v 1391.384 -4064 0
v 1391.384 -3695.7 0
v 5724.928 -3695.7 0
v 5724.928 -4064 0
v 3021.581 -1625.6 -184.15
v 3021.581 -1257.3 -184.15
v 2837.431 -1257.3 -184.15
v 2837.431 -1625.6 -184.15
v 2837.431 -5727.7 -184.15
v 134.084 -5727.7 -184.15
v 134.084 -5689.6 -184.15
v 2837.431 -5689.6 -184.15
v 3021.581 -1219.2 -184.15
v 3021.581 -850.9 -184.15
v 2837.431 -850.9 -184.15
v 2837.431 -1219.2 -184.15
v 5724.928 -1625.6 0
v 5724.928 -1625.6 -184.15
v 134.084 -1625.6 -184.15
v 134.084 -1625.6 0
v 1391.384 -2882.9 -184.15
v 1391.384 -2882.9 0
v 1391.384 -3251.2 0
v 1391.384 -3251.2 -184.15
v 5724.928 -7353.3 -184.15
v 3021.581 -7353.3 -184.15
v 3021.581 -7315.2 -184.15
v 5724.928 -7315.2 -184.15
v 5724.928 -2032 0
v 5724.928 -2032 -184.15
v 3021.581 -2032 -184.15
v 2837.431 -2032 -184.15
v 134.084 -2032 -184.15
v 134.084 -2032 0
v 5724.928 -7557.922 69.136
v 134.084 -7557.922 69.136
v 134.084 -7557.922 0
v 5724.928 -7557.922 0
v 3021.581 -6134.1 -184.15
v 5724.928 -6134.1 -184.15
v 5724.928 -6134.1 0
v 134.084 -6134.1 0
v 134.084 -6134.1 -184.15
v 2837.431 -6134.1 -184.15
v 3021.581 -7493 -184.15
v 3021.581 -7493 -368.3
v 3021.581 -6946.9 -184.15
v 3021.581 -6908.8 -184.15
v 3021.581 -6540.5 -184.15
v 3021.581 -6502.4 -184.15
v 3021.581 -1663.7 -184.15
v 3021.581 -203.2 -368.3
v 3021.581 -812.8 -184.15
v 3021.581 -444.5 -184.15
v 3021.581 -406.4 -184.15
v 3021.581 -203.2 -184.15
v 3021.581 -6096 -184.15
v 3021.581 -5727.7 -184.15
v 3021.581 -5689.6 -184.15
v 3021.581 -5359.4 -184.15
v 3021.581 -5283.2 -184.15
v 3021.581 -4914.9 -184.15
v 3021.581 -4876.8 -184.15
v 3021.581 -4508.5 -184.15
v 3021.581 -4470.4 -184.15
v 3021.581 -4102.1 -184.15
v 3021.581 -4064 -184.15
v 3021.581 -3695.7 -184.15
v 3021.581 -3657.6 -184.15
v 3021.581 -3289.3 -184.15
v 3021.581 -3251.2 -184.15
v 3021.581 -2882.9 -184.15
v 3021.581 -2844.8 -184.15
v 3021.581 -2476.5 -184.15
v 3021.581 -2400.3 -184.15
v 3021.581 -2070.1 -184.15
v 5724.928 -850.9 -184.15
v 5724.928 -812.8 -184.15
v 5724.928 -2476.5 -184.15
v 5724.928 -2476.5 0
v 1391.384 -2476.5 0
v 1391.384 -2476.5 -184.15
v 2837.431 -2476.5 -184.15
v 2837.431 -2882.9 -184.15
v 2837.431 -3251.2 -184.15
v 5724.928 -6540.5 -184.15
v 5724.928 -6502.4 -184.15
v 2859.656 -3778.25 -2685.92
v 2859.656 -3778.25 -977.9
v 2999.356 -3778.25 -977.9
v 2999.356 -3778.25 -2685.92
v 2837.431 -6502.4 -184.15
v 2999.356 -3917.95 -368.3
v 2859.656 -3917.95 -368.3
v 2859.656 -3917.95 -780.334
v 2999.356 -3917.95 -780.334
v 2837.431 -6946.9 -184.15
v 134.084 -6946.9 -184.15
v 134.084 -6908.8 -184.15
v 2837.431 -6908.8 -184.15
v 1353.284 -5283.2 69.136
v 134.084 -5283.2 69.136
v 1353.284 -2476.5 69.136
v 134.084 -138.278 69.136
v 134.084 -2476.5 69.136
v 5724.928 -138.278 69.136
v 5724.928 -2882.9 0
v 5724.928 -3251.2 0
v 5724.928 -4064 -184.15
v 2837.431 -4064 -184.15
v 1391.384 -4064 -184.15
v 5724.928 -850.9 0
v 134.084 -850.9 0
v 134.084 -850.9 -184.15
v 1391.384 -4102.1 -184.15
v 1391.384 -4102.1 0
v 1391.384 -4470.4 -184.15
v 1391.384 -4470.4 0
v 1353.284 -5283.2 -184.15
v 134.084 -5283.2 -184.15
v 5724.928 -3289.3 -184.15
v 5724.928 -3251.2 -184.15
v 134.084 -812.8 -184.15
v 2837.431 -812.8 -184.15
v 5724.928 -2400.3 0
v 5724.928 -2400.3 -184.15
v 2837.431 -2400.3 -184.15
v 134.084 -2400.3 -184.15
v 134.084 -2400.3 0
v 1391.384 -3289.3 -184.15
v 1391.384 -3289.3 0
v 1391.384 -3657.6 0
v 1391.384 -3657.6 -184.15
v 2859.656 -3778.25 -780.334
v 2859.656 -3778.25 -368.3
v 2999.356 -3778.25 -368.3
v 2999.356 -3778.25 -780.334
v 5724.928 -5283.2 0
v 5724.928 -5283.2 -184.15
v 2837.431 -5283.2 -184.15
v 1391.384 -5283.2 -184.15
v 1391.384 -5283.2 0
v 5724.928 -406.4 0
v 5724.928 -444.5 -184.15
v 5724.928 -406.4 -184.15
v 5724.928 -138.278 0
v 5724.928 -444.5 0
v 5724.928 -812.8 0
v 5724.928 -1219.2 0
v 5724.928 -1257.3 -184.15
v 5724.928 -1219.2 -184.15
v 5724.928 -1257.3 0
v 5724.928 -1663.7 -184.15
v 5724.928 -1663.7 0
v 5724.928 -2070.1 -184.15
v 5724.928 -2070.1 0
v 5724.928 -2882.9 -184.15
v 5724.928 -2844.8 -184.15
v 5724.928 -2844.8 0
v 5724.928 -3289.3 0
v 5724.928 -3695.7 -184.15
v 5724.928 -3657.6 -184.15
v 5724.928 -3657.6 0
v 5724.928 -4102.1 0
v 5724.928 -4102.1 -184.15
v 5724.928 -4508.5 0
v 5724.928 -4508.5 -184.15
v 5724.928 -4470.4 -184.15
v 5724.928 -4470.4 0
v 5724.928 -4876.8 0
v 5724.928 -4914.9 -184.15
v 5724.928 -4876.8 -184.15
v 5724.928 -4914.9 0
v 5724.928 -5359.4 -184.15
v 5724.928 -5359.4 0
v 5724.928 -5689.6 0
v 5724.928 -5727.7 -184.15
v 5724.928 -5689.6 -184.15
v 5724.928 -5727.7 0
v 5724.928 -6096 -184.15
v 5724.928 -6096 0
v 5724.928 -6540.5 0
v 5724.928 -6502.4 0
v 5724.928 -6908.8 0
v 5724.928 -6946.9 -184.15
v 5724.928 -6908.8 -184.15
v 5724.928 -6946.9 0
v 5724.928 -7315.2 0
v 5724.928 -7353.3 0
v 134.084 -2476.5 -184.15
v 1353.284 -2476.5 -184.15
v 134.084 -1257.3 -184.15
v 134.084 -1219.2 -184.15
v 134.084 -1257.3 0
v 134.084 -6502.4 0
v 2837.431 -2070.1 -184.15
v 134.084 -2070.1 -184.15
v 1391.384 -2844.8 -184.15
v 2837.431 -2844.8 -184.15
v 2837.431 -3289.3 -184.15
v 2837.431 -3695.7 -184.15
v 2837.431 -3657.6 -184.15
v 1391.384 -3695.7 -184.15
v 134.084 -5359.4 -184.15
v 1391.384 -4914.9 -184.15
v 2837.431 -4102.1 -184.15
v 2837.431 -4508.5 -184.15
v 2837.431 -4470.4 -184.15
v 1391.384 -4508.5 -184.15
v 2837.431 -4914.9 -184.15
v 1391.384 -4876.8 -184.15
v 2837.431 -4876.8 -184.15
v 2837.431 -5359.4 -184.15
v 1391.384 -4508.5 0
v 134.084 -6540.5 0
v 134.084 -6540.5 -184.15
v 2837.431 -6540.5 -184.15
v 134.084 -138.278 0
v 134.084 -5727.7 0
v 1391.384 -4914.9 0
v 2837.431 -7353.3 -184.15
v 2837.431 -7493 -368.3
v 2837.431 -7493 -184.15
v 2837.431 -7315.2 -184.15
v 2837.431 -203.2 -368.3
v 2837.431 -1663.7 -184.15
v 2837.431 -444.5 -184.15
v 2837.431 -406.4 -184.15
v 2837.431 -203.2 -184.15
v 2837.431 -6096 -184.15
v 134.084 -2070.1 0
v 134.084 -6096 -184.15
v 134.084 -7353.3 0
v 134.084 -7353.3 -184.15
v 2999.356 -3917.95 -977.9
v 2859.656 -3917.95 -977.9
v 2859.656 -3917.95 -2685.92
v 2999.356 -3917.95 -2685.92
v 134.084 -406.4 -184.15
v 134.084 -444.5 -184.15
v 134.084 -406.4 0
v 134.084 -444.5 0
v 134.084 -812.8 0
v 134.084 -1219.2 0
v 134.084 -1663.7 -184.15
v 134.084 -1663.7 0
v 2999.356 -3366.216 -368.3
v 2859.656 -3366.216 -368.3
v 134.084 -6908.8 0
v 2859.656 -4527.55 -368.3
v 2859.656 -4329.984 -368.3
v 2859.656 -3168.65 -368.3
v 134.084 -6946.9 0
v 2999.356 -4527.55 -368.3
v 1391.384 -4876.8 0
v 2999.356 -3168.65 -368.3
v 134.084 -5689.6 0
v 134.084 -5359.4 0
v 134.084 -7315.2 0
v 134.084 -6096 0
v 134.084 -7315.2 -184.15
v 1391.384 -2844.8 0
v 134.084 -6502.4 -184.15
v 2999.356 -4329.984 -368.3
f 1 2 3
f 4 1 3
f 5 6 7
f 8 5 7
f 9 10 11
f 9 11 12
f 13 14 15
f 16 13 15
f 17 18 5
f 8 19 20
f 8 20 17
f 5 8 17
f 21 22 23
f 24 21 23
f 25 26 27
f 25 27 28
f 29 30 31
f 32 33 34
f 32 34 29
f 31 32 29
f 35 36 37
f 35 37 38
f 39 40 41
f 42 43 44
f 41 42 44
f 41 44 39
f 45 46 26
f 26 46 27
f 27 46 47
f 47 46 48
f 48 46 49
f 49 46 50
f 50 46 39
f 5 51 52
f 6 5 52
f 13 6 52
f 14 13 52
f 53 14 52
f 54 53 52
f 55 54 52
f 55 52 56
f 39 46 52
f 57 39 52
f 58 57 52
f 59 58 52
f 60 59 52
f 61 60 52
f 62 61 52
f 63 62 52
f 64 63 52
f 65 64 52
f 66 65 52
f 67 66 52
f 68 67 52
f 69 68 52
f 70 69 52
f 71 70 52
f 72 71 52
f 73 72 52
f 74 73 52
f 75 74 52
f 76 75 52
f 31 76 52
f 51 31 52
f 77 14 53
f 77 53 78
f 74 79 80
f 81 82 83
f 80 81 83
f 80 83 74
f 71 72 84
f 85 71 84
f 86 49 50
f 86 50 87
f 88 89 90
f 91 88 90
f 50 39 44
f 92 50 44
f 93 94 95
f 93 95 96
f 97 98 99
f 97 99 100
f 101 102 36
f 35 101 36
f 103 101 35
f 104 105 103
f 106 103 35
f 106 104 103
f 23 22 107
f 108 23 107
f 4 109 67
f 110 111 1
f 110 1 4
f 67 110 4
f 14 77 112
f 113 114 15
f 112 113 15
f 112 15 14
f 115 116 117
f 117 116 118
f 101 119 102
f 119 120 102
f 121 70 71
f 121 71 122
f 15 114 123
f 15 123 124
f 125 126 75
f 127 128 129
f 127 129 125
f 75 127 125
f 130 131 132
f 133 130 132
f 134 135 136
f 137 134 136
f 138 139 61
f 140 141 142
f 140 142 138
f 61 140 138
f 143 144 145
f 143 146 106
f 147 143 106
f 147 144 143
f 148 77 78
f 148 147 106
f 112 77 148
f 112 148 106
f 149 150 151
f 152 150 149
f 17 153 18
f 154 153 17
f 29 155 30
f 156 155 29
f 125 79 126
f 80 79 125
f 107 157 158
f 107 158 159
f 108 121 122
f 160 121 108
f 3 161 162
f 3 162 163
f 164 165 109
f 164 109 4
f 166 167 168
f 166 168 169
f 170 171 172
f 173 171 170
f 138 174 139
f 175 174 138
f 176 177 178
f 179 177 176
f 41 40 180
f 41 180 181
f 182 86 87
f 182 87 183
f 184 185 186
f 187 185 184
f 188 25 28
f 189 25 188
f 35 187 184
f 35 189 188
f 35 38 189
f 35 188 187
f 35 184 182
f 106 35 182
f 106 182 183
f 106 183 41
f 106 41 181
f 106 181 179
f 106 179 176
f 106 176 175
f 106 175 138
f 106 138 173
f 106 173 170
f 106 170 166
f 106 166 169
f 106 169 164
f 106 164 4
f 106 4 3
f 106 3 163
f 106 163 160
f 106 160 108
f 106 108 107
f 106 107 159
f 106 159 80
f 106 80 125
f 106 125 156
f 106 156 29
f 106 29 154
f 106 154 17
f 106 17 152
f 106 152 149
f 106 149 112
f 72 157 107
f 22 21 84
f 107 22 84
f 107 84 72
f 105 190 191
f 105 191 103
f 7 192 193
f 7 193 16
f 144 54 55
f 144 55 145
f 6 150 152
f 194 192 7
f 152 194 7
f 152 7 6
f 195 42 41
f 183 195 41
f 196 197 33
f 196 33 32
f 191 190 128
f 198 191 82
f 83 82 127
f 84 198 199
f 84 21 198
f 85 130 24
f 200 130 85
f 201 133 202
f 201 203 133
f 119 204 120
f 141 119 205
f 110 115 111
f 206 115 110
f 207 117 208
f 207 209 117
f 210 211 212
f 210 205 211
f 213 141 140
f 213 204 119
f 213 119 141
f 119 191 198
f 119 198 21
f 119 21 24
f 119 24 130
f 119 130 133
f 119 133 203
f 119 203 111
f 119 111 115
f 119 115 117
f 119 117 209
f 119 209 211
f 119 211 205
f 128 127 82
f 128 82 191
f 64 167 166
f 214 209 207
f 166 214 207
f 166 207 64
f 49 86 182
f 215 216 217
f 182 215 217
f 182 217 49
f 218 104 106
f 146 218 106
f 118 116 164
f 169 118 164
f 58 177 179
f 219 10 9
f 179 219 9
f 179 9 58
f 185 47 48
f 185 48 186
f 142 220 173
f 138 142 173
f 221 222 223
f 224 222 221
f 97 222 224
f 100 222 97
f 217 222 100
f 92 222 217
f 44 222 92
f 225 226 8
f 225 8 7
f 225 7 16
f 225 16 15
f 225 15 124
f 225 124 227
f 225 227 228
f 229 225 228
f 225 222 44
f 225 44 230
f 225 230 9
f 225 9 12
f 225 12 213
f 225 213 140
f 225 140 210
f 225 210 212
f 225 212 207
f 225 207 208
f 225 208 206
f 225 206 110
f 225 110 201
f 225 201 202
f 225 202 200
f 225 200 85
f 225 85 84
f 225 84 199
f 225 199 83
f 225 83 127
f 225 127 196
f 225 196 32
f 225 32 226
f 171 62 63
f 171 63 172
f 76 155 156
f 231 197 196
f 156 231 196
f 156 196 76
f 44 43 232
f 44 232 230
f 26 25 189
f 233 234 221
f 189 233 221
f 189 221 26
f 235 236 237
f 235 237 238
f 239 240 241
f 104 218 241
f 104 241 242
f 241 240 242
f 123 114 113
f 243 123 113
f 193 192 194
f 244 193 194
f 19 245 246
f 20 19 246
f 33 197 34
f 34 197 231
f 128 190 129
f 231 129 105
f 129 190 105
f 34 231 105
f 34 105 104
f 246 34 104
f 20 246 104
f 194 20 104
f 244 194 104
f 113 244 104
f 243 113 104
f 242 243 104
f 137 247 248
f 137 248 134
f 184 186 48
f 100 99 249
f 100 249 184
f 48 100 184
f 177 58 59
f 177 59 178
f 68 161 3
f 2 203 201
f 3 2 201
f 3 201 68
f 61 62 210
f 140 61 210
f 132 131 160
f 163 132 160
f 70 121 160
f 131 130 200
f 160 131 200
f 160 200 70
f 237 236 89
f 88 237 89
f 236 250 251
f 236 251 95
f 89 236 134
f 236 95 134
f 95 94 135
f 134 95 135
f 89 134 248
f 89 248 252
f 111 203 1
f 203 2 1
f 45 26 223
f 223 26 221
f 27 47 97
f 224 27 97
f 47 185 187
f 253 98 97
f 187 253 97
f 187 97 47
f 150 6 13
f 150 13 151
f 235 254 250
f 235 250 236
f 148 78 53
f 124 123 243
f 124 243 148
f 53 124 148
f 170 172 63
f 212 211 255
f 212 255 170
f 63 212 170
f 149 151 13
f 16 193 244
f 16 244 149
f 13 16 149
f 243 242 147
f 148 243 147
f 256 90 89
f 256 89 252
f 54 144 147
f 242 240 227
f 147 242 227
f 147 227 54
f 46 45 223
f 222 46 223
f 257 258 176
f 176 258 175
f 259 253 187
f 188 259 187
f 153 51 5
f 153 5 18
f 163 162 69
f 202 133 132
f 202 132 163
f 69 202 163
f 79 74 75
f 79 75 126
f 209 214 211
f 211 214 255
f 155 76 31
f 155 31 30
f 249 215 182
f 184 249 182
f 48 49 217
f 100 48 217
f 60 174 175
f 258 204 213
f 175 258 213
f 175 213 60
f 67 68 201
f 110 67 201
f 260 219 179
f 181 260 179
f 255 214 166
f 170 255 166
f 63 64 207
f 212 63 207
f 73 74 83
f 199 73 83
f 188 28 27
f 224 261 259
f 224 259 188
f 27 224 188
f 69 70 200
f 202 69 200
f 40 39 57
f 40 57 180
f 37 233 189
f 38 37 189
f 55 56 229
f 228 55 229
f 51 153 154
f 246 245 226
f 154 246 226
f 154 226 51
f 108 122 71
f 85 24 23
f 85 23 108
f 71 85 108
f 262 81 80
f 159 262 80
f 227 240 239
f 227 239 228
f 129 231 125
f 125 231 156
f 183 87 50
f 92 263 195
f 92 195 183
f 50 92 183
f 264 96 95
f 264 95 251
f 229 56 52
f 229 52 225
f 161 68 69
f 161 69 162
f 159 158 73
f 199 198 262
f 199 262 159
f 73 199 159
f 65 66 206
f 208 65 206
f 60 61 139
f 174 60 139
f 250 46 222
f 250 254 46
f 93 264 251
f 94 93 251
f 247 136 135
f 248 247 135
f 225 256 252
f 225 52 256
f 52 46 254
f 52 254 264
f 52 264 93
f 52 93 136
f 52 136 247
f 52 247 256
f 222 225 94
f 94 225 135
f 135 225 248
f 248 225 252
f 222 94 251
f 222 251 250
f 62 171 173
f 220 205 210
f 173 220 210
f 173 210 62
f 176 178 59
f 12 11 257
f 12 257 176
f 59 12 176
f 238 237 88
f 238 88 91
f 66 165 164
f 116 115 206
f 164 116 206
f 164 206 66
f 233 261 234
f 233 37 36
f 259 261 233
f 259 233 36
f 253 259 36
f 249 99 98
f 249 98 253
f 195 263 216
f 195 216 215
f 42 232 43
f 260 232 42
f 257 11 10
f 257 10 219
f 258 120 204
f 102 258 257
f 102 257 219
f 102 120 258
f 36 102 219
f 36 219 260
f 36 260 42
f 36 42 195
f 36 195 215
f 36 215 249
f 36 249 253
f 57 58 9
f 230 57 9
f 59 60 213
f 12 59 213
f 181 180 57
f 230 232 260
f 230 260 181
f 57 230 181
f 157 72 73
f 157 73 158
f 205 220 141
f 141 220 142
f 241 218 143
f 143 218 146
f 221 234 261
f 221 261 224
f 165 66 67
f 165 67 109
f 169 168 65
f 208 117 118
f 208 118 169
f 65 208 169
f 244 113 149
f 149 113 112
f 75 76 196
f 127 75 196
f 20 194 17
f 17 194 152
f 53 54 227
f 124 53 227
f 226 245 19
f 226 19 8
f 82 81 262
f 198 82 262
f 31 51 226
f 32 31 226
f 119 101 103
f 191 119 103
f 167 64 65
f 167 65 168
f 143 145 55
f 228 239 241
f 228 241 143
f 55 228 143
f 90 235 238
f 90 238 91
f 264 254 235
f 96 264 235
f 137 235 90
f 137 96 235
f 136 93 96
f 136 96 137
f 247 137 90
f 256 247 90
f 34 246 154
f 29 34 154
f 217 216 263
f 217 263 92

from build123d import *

# Parameters (mm, degrees)
F0_W      = 5867.4
F0_H      = 7696.2
F1_DEPTH  = 69.135625
F2_W      = 5867.4
F2_H      = 7696.2
F2_W_2    = 5791.2
F2_H_2    = 7620
F3_DEPTH  = 184.15
F4_W      = 38.1
F4_H      = 184.15
F5_DEPTH  = 5863.2060388453
F7_W      = 184.15
F7_H      = 184.15
F8_DEPTH  = 7289.8
F9_W      = 139.7
F9_H      = 139.7
F10_DEPTH = 2317.62046
F12_DEPTH = 139.7
F13_W     = 5867.4
F13_H     = 7696.2
F13_W_2   = 5590.8448
F13_H_2   = 7419.6448
F14_DEPTH = 253.285625
F15_W     = 1219.2
F15_H     = 2806.7
F16_DEPTH = 253.285625
F17_W     = 368.3
F17_H     = 184.15
F18_DEPTH = 38.1
F19_DEPTH = 38.1
F20_DEPTH = 38.1


with BuildPart() as f1:
    # F0 (on Top) → F1 (new body)
    with BuildSketch(Plane.XY):
        with Locations((2929.5060388453, -3848.1)):
            Rectangle(F0_W, F0_H)
    extrude(amount=F1_DEPTH)

    # F2 (on face) → F3 (join)
    with BuildSketch(Plane(origin=(0, 0, 0), x_dir=(1, 0, 0), z_dir=(0, 0, -1))):
        with Locations((2929.5060388453, 3848.1)):
            Rectangle(F2_W, F2_H)
        with Locations((2929.5060388453, 3848.1)):
            Rectangle(F2_W_2, F2_H_2, mode=Mode.SUBTRACT)
    extrude(amount=F3_DEPTH)

    # F4 (on Right) → F5 (join, through all)
    with BuildSketch(Plane.YZ):
        with Locations((-425.45, -92.075)):
            Rectangle(F4_W, F4_H)
        with Locations((-831.85, -92.075)):
            Rectangle(F4_W, F4_H)
        with Locations((-1238.25, -92.075)):
            Rectangle(F4_W, F4_H)
        with Locations((-1644.65, -92.075)):
            Rectangle(F4_W, F4_H)
        with Locations((-2051.05, -92.075)):
            Rectangle(F4_W, F4_H)
        with Locations((-2457.45, -92.075)):
            Rectangle(F4_W, F4_H)
        with Locations((-2863.85, -92.075)):
            Rectangle(F4_W, F4_H)
        with Locations((-3270.25, -92.075)):
            Rectangle(F4_W, F4_H)
        with Locations((-3676.65, -92.075)):
            Rectangle(F4_W, F4_H)
        with Locations((-4083.05, -92.075)):
            Rectangle(F4_W, F4_H)
        with Locations((-4489.45, -92.075)):
            Rectangle(F4_W, F4_H)
        with Locations((-4895.85, -92.075)):
            Rectangle(F4_W, F4_H)
        with Locations((-5302.25, -92.075)):
            Rectangle(F4_W, F4_H)
        with Locations((-5708.65, -92.075)):
            Rectangle(F4_W, F4_H)
        with Locations((-6115.05, -92.075)):
            Rectangle(F4_W, F4_H)
        with Locations((-6521.45, -92.075)):
            Rectangle(F4_W, F4_H)
        with Locations((-6927.85, -92.075)):
            Rectangle(F4_W, F4_H)
        with Locations((-7334.25, -92.075)):
            Rectangle(F4_W, F4_H)
    extrude(amount=F5_DEPTH)

    # F7 (on offset) → F8 (join)
    with BuildSketch(Plane(origin=(0, -203.2, 0), x_dir=(-1, 0, 0), z_dir=(0, 1, 0))):
        with Locations((-2929.5060388453, -276.225)):
            Rectangle(F7_W, F7_H)
    extrude(amount=-F8_DEPTH)

    # F9 (on face) → F10 (join)
    with BuildSketch(Plane(origin=(0, 0, -368.3), x_dir=(1, 0, 0), z_dir=(0, 0, -1))):
        with Locations((2929.5060388453, 3848.1)):
            Rectangle(F9_W, F9_H)
    extrude(amount=F10_DEPTH)

    # F11 (on face) → F12 (join, through all)
    with BuildSketch(Plane.YZ.offset(2999.3560388453)):
        Polygon((-3917.95, -780.3343653365), (-4329.9843653365, -368.3), (-4527.55, -368.3), (-3917.95, -977.9), align=None)
        Polygon((-3366.2156346635, -368.3), (-3778.25, -780.3343653365), (-3778.25, -977.9), (-3168.65, -368.3), align=None)
    extrude(amount=-F12_DEPTH)

    # F13 (on face) → F14 (cut, through all)
    with BuildSketch(Plane.XY.offset(69.135625)):
        with Locations((2929.5060388453, -3848.1)):
            Rectangle(F13_W, F13_H)
        with Locations((2929.5060388453, -3848.1)):
            Rectangle(F13_W_2, F13_H_2, mode=Mode.SUBTRACT)
    extrude(amount=-F14_DEPTH, mode=Mode.SUBTRACT)

    # F15 (on face) → F16 (cut, through all)
    with BuildSketch(Plane.XY.offset(69.135625)):
        with Locations((743.6836388453, -3879.85)):
            Rectangle(F15_W, F15_H)
    extrude(amount=-F16_DEPTH, mode=Mode.SUBTRACT)

    # F17 (on face) → F18 (join)
    with BuildSketch(Plane(origin=(1353.2836388453, 0, 0), x_dir=(0, -1, 0), z_dir=(-1, 0, 0))):
        Polygon((5283.2, 69.135625), (2476.5, 69.135625), (2476.5, 0), (2844.8, 0), (2844.8, -184.15), (2882.9, -184.15), (2882.9, 0), (3251.2, 0), (3251.2, -184.15), (3289.3, -184.15), (3289.3, 0), (3657.6, 0), (3657.6, -184.15), (3695.7, -184.15), (3695.7, 0), (4064, 0), (4064, -184.15), (4102.1, -184.15), (4102.1, 0), (4470.4, 0), (4470.4, -184.15), (4508.5, -184.15), (4508.5, 0), (4876.8, 0), (4876.8, -184.15), (4914.9, -184.15), (4914.9, 0), (5283.2, 0), align=None)
        with Locations((2660.65, -92.075)):
            Rectangle(F17_W, F17_H)
        with Locations((5099.05, -92.075)):
            Rectangle(F17_W, F17_H)
        with Locations((3067.05, -92.075)):
            Rectangle(F17_W, F17_H)
        with Locations((4692.65, -92.075)):
            Rectangle(F17_W, F17_H)
        with Locations((3473.45, -92.075)):
            Rectangle(F17_W, F17_H)
        with Locations((4286.25, -92.075)):
            Rectangle(F17_W, F17_H)
        with Locations((3879.85, -92.075)):
            Rectangle(F17_W, F17_H)
    extrude(amount=-F18_DEPTH)

    # F19 (add): a face of the model
    f19_faces = [f1.faces().sort_by_distance(p)[0] for p in [
        (2929.5060388453, -5321.3, -92.075),
    ]]
    extrude(f19_faces, amount=F19_DEPTH)

    # F20 (add): a face of the model
    f20_faces = [f1.faces().sort_by_distance(p)[0] for p in [
        (2929.5060388453, -2438.4, -92.075),
    ]]
    extrude(f20_faces, amount=F20_DEPTH)


solid = f1.part
